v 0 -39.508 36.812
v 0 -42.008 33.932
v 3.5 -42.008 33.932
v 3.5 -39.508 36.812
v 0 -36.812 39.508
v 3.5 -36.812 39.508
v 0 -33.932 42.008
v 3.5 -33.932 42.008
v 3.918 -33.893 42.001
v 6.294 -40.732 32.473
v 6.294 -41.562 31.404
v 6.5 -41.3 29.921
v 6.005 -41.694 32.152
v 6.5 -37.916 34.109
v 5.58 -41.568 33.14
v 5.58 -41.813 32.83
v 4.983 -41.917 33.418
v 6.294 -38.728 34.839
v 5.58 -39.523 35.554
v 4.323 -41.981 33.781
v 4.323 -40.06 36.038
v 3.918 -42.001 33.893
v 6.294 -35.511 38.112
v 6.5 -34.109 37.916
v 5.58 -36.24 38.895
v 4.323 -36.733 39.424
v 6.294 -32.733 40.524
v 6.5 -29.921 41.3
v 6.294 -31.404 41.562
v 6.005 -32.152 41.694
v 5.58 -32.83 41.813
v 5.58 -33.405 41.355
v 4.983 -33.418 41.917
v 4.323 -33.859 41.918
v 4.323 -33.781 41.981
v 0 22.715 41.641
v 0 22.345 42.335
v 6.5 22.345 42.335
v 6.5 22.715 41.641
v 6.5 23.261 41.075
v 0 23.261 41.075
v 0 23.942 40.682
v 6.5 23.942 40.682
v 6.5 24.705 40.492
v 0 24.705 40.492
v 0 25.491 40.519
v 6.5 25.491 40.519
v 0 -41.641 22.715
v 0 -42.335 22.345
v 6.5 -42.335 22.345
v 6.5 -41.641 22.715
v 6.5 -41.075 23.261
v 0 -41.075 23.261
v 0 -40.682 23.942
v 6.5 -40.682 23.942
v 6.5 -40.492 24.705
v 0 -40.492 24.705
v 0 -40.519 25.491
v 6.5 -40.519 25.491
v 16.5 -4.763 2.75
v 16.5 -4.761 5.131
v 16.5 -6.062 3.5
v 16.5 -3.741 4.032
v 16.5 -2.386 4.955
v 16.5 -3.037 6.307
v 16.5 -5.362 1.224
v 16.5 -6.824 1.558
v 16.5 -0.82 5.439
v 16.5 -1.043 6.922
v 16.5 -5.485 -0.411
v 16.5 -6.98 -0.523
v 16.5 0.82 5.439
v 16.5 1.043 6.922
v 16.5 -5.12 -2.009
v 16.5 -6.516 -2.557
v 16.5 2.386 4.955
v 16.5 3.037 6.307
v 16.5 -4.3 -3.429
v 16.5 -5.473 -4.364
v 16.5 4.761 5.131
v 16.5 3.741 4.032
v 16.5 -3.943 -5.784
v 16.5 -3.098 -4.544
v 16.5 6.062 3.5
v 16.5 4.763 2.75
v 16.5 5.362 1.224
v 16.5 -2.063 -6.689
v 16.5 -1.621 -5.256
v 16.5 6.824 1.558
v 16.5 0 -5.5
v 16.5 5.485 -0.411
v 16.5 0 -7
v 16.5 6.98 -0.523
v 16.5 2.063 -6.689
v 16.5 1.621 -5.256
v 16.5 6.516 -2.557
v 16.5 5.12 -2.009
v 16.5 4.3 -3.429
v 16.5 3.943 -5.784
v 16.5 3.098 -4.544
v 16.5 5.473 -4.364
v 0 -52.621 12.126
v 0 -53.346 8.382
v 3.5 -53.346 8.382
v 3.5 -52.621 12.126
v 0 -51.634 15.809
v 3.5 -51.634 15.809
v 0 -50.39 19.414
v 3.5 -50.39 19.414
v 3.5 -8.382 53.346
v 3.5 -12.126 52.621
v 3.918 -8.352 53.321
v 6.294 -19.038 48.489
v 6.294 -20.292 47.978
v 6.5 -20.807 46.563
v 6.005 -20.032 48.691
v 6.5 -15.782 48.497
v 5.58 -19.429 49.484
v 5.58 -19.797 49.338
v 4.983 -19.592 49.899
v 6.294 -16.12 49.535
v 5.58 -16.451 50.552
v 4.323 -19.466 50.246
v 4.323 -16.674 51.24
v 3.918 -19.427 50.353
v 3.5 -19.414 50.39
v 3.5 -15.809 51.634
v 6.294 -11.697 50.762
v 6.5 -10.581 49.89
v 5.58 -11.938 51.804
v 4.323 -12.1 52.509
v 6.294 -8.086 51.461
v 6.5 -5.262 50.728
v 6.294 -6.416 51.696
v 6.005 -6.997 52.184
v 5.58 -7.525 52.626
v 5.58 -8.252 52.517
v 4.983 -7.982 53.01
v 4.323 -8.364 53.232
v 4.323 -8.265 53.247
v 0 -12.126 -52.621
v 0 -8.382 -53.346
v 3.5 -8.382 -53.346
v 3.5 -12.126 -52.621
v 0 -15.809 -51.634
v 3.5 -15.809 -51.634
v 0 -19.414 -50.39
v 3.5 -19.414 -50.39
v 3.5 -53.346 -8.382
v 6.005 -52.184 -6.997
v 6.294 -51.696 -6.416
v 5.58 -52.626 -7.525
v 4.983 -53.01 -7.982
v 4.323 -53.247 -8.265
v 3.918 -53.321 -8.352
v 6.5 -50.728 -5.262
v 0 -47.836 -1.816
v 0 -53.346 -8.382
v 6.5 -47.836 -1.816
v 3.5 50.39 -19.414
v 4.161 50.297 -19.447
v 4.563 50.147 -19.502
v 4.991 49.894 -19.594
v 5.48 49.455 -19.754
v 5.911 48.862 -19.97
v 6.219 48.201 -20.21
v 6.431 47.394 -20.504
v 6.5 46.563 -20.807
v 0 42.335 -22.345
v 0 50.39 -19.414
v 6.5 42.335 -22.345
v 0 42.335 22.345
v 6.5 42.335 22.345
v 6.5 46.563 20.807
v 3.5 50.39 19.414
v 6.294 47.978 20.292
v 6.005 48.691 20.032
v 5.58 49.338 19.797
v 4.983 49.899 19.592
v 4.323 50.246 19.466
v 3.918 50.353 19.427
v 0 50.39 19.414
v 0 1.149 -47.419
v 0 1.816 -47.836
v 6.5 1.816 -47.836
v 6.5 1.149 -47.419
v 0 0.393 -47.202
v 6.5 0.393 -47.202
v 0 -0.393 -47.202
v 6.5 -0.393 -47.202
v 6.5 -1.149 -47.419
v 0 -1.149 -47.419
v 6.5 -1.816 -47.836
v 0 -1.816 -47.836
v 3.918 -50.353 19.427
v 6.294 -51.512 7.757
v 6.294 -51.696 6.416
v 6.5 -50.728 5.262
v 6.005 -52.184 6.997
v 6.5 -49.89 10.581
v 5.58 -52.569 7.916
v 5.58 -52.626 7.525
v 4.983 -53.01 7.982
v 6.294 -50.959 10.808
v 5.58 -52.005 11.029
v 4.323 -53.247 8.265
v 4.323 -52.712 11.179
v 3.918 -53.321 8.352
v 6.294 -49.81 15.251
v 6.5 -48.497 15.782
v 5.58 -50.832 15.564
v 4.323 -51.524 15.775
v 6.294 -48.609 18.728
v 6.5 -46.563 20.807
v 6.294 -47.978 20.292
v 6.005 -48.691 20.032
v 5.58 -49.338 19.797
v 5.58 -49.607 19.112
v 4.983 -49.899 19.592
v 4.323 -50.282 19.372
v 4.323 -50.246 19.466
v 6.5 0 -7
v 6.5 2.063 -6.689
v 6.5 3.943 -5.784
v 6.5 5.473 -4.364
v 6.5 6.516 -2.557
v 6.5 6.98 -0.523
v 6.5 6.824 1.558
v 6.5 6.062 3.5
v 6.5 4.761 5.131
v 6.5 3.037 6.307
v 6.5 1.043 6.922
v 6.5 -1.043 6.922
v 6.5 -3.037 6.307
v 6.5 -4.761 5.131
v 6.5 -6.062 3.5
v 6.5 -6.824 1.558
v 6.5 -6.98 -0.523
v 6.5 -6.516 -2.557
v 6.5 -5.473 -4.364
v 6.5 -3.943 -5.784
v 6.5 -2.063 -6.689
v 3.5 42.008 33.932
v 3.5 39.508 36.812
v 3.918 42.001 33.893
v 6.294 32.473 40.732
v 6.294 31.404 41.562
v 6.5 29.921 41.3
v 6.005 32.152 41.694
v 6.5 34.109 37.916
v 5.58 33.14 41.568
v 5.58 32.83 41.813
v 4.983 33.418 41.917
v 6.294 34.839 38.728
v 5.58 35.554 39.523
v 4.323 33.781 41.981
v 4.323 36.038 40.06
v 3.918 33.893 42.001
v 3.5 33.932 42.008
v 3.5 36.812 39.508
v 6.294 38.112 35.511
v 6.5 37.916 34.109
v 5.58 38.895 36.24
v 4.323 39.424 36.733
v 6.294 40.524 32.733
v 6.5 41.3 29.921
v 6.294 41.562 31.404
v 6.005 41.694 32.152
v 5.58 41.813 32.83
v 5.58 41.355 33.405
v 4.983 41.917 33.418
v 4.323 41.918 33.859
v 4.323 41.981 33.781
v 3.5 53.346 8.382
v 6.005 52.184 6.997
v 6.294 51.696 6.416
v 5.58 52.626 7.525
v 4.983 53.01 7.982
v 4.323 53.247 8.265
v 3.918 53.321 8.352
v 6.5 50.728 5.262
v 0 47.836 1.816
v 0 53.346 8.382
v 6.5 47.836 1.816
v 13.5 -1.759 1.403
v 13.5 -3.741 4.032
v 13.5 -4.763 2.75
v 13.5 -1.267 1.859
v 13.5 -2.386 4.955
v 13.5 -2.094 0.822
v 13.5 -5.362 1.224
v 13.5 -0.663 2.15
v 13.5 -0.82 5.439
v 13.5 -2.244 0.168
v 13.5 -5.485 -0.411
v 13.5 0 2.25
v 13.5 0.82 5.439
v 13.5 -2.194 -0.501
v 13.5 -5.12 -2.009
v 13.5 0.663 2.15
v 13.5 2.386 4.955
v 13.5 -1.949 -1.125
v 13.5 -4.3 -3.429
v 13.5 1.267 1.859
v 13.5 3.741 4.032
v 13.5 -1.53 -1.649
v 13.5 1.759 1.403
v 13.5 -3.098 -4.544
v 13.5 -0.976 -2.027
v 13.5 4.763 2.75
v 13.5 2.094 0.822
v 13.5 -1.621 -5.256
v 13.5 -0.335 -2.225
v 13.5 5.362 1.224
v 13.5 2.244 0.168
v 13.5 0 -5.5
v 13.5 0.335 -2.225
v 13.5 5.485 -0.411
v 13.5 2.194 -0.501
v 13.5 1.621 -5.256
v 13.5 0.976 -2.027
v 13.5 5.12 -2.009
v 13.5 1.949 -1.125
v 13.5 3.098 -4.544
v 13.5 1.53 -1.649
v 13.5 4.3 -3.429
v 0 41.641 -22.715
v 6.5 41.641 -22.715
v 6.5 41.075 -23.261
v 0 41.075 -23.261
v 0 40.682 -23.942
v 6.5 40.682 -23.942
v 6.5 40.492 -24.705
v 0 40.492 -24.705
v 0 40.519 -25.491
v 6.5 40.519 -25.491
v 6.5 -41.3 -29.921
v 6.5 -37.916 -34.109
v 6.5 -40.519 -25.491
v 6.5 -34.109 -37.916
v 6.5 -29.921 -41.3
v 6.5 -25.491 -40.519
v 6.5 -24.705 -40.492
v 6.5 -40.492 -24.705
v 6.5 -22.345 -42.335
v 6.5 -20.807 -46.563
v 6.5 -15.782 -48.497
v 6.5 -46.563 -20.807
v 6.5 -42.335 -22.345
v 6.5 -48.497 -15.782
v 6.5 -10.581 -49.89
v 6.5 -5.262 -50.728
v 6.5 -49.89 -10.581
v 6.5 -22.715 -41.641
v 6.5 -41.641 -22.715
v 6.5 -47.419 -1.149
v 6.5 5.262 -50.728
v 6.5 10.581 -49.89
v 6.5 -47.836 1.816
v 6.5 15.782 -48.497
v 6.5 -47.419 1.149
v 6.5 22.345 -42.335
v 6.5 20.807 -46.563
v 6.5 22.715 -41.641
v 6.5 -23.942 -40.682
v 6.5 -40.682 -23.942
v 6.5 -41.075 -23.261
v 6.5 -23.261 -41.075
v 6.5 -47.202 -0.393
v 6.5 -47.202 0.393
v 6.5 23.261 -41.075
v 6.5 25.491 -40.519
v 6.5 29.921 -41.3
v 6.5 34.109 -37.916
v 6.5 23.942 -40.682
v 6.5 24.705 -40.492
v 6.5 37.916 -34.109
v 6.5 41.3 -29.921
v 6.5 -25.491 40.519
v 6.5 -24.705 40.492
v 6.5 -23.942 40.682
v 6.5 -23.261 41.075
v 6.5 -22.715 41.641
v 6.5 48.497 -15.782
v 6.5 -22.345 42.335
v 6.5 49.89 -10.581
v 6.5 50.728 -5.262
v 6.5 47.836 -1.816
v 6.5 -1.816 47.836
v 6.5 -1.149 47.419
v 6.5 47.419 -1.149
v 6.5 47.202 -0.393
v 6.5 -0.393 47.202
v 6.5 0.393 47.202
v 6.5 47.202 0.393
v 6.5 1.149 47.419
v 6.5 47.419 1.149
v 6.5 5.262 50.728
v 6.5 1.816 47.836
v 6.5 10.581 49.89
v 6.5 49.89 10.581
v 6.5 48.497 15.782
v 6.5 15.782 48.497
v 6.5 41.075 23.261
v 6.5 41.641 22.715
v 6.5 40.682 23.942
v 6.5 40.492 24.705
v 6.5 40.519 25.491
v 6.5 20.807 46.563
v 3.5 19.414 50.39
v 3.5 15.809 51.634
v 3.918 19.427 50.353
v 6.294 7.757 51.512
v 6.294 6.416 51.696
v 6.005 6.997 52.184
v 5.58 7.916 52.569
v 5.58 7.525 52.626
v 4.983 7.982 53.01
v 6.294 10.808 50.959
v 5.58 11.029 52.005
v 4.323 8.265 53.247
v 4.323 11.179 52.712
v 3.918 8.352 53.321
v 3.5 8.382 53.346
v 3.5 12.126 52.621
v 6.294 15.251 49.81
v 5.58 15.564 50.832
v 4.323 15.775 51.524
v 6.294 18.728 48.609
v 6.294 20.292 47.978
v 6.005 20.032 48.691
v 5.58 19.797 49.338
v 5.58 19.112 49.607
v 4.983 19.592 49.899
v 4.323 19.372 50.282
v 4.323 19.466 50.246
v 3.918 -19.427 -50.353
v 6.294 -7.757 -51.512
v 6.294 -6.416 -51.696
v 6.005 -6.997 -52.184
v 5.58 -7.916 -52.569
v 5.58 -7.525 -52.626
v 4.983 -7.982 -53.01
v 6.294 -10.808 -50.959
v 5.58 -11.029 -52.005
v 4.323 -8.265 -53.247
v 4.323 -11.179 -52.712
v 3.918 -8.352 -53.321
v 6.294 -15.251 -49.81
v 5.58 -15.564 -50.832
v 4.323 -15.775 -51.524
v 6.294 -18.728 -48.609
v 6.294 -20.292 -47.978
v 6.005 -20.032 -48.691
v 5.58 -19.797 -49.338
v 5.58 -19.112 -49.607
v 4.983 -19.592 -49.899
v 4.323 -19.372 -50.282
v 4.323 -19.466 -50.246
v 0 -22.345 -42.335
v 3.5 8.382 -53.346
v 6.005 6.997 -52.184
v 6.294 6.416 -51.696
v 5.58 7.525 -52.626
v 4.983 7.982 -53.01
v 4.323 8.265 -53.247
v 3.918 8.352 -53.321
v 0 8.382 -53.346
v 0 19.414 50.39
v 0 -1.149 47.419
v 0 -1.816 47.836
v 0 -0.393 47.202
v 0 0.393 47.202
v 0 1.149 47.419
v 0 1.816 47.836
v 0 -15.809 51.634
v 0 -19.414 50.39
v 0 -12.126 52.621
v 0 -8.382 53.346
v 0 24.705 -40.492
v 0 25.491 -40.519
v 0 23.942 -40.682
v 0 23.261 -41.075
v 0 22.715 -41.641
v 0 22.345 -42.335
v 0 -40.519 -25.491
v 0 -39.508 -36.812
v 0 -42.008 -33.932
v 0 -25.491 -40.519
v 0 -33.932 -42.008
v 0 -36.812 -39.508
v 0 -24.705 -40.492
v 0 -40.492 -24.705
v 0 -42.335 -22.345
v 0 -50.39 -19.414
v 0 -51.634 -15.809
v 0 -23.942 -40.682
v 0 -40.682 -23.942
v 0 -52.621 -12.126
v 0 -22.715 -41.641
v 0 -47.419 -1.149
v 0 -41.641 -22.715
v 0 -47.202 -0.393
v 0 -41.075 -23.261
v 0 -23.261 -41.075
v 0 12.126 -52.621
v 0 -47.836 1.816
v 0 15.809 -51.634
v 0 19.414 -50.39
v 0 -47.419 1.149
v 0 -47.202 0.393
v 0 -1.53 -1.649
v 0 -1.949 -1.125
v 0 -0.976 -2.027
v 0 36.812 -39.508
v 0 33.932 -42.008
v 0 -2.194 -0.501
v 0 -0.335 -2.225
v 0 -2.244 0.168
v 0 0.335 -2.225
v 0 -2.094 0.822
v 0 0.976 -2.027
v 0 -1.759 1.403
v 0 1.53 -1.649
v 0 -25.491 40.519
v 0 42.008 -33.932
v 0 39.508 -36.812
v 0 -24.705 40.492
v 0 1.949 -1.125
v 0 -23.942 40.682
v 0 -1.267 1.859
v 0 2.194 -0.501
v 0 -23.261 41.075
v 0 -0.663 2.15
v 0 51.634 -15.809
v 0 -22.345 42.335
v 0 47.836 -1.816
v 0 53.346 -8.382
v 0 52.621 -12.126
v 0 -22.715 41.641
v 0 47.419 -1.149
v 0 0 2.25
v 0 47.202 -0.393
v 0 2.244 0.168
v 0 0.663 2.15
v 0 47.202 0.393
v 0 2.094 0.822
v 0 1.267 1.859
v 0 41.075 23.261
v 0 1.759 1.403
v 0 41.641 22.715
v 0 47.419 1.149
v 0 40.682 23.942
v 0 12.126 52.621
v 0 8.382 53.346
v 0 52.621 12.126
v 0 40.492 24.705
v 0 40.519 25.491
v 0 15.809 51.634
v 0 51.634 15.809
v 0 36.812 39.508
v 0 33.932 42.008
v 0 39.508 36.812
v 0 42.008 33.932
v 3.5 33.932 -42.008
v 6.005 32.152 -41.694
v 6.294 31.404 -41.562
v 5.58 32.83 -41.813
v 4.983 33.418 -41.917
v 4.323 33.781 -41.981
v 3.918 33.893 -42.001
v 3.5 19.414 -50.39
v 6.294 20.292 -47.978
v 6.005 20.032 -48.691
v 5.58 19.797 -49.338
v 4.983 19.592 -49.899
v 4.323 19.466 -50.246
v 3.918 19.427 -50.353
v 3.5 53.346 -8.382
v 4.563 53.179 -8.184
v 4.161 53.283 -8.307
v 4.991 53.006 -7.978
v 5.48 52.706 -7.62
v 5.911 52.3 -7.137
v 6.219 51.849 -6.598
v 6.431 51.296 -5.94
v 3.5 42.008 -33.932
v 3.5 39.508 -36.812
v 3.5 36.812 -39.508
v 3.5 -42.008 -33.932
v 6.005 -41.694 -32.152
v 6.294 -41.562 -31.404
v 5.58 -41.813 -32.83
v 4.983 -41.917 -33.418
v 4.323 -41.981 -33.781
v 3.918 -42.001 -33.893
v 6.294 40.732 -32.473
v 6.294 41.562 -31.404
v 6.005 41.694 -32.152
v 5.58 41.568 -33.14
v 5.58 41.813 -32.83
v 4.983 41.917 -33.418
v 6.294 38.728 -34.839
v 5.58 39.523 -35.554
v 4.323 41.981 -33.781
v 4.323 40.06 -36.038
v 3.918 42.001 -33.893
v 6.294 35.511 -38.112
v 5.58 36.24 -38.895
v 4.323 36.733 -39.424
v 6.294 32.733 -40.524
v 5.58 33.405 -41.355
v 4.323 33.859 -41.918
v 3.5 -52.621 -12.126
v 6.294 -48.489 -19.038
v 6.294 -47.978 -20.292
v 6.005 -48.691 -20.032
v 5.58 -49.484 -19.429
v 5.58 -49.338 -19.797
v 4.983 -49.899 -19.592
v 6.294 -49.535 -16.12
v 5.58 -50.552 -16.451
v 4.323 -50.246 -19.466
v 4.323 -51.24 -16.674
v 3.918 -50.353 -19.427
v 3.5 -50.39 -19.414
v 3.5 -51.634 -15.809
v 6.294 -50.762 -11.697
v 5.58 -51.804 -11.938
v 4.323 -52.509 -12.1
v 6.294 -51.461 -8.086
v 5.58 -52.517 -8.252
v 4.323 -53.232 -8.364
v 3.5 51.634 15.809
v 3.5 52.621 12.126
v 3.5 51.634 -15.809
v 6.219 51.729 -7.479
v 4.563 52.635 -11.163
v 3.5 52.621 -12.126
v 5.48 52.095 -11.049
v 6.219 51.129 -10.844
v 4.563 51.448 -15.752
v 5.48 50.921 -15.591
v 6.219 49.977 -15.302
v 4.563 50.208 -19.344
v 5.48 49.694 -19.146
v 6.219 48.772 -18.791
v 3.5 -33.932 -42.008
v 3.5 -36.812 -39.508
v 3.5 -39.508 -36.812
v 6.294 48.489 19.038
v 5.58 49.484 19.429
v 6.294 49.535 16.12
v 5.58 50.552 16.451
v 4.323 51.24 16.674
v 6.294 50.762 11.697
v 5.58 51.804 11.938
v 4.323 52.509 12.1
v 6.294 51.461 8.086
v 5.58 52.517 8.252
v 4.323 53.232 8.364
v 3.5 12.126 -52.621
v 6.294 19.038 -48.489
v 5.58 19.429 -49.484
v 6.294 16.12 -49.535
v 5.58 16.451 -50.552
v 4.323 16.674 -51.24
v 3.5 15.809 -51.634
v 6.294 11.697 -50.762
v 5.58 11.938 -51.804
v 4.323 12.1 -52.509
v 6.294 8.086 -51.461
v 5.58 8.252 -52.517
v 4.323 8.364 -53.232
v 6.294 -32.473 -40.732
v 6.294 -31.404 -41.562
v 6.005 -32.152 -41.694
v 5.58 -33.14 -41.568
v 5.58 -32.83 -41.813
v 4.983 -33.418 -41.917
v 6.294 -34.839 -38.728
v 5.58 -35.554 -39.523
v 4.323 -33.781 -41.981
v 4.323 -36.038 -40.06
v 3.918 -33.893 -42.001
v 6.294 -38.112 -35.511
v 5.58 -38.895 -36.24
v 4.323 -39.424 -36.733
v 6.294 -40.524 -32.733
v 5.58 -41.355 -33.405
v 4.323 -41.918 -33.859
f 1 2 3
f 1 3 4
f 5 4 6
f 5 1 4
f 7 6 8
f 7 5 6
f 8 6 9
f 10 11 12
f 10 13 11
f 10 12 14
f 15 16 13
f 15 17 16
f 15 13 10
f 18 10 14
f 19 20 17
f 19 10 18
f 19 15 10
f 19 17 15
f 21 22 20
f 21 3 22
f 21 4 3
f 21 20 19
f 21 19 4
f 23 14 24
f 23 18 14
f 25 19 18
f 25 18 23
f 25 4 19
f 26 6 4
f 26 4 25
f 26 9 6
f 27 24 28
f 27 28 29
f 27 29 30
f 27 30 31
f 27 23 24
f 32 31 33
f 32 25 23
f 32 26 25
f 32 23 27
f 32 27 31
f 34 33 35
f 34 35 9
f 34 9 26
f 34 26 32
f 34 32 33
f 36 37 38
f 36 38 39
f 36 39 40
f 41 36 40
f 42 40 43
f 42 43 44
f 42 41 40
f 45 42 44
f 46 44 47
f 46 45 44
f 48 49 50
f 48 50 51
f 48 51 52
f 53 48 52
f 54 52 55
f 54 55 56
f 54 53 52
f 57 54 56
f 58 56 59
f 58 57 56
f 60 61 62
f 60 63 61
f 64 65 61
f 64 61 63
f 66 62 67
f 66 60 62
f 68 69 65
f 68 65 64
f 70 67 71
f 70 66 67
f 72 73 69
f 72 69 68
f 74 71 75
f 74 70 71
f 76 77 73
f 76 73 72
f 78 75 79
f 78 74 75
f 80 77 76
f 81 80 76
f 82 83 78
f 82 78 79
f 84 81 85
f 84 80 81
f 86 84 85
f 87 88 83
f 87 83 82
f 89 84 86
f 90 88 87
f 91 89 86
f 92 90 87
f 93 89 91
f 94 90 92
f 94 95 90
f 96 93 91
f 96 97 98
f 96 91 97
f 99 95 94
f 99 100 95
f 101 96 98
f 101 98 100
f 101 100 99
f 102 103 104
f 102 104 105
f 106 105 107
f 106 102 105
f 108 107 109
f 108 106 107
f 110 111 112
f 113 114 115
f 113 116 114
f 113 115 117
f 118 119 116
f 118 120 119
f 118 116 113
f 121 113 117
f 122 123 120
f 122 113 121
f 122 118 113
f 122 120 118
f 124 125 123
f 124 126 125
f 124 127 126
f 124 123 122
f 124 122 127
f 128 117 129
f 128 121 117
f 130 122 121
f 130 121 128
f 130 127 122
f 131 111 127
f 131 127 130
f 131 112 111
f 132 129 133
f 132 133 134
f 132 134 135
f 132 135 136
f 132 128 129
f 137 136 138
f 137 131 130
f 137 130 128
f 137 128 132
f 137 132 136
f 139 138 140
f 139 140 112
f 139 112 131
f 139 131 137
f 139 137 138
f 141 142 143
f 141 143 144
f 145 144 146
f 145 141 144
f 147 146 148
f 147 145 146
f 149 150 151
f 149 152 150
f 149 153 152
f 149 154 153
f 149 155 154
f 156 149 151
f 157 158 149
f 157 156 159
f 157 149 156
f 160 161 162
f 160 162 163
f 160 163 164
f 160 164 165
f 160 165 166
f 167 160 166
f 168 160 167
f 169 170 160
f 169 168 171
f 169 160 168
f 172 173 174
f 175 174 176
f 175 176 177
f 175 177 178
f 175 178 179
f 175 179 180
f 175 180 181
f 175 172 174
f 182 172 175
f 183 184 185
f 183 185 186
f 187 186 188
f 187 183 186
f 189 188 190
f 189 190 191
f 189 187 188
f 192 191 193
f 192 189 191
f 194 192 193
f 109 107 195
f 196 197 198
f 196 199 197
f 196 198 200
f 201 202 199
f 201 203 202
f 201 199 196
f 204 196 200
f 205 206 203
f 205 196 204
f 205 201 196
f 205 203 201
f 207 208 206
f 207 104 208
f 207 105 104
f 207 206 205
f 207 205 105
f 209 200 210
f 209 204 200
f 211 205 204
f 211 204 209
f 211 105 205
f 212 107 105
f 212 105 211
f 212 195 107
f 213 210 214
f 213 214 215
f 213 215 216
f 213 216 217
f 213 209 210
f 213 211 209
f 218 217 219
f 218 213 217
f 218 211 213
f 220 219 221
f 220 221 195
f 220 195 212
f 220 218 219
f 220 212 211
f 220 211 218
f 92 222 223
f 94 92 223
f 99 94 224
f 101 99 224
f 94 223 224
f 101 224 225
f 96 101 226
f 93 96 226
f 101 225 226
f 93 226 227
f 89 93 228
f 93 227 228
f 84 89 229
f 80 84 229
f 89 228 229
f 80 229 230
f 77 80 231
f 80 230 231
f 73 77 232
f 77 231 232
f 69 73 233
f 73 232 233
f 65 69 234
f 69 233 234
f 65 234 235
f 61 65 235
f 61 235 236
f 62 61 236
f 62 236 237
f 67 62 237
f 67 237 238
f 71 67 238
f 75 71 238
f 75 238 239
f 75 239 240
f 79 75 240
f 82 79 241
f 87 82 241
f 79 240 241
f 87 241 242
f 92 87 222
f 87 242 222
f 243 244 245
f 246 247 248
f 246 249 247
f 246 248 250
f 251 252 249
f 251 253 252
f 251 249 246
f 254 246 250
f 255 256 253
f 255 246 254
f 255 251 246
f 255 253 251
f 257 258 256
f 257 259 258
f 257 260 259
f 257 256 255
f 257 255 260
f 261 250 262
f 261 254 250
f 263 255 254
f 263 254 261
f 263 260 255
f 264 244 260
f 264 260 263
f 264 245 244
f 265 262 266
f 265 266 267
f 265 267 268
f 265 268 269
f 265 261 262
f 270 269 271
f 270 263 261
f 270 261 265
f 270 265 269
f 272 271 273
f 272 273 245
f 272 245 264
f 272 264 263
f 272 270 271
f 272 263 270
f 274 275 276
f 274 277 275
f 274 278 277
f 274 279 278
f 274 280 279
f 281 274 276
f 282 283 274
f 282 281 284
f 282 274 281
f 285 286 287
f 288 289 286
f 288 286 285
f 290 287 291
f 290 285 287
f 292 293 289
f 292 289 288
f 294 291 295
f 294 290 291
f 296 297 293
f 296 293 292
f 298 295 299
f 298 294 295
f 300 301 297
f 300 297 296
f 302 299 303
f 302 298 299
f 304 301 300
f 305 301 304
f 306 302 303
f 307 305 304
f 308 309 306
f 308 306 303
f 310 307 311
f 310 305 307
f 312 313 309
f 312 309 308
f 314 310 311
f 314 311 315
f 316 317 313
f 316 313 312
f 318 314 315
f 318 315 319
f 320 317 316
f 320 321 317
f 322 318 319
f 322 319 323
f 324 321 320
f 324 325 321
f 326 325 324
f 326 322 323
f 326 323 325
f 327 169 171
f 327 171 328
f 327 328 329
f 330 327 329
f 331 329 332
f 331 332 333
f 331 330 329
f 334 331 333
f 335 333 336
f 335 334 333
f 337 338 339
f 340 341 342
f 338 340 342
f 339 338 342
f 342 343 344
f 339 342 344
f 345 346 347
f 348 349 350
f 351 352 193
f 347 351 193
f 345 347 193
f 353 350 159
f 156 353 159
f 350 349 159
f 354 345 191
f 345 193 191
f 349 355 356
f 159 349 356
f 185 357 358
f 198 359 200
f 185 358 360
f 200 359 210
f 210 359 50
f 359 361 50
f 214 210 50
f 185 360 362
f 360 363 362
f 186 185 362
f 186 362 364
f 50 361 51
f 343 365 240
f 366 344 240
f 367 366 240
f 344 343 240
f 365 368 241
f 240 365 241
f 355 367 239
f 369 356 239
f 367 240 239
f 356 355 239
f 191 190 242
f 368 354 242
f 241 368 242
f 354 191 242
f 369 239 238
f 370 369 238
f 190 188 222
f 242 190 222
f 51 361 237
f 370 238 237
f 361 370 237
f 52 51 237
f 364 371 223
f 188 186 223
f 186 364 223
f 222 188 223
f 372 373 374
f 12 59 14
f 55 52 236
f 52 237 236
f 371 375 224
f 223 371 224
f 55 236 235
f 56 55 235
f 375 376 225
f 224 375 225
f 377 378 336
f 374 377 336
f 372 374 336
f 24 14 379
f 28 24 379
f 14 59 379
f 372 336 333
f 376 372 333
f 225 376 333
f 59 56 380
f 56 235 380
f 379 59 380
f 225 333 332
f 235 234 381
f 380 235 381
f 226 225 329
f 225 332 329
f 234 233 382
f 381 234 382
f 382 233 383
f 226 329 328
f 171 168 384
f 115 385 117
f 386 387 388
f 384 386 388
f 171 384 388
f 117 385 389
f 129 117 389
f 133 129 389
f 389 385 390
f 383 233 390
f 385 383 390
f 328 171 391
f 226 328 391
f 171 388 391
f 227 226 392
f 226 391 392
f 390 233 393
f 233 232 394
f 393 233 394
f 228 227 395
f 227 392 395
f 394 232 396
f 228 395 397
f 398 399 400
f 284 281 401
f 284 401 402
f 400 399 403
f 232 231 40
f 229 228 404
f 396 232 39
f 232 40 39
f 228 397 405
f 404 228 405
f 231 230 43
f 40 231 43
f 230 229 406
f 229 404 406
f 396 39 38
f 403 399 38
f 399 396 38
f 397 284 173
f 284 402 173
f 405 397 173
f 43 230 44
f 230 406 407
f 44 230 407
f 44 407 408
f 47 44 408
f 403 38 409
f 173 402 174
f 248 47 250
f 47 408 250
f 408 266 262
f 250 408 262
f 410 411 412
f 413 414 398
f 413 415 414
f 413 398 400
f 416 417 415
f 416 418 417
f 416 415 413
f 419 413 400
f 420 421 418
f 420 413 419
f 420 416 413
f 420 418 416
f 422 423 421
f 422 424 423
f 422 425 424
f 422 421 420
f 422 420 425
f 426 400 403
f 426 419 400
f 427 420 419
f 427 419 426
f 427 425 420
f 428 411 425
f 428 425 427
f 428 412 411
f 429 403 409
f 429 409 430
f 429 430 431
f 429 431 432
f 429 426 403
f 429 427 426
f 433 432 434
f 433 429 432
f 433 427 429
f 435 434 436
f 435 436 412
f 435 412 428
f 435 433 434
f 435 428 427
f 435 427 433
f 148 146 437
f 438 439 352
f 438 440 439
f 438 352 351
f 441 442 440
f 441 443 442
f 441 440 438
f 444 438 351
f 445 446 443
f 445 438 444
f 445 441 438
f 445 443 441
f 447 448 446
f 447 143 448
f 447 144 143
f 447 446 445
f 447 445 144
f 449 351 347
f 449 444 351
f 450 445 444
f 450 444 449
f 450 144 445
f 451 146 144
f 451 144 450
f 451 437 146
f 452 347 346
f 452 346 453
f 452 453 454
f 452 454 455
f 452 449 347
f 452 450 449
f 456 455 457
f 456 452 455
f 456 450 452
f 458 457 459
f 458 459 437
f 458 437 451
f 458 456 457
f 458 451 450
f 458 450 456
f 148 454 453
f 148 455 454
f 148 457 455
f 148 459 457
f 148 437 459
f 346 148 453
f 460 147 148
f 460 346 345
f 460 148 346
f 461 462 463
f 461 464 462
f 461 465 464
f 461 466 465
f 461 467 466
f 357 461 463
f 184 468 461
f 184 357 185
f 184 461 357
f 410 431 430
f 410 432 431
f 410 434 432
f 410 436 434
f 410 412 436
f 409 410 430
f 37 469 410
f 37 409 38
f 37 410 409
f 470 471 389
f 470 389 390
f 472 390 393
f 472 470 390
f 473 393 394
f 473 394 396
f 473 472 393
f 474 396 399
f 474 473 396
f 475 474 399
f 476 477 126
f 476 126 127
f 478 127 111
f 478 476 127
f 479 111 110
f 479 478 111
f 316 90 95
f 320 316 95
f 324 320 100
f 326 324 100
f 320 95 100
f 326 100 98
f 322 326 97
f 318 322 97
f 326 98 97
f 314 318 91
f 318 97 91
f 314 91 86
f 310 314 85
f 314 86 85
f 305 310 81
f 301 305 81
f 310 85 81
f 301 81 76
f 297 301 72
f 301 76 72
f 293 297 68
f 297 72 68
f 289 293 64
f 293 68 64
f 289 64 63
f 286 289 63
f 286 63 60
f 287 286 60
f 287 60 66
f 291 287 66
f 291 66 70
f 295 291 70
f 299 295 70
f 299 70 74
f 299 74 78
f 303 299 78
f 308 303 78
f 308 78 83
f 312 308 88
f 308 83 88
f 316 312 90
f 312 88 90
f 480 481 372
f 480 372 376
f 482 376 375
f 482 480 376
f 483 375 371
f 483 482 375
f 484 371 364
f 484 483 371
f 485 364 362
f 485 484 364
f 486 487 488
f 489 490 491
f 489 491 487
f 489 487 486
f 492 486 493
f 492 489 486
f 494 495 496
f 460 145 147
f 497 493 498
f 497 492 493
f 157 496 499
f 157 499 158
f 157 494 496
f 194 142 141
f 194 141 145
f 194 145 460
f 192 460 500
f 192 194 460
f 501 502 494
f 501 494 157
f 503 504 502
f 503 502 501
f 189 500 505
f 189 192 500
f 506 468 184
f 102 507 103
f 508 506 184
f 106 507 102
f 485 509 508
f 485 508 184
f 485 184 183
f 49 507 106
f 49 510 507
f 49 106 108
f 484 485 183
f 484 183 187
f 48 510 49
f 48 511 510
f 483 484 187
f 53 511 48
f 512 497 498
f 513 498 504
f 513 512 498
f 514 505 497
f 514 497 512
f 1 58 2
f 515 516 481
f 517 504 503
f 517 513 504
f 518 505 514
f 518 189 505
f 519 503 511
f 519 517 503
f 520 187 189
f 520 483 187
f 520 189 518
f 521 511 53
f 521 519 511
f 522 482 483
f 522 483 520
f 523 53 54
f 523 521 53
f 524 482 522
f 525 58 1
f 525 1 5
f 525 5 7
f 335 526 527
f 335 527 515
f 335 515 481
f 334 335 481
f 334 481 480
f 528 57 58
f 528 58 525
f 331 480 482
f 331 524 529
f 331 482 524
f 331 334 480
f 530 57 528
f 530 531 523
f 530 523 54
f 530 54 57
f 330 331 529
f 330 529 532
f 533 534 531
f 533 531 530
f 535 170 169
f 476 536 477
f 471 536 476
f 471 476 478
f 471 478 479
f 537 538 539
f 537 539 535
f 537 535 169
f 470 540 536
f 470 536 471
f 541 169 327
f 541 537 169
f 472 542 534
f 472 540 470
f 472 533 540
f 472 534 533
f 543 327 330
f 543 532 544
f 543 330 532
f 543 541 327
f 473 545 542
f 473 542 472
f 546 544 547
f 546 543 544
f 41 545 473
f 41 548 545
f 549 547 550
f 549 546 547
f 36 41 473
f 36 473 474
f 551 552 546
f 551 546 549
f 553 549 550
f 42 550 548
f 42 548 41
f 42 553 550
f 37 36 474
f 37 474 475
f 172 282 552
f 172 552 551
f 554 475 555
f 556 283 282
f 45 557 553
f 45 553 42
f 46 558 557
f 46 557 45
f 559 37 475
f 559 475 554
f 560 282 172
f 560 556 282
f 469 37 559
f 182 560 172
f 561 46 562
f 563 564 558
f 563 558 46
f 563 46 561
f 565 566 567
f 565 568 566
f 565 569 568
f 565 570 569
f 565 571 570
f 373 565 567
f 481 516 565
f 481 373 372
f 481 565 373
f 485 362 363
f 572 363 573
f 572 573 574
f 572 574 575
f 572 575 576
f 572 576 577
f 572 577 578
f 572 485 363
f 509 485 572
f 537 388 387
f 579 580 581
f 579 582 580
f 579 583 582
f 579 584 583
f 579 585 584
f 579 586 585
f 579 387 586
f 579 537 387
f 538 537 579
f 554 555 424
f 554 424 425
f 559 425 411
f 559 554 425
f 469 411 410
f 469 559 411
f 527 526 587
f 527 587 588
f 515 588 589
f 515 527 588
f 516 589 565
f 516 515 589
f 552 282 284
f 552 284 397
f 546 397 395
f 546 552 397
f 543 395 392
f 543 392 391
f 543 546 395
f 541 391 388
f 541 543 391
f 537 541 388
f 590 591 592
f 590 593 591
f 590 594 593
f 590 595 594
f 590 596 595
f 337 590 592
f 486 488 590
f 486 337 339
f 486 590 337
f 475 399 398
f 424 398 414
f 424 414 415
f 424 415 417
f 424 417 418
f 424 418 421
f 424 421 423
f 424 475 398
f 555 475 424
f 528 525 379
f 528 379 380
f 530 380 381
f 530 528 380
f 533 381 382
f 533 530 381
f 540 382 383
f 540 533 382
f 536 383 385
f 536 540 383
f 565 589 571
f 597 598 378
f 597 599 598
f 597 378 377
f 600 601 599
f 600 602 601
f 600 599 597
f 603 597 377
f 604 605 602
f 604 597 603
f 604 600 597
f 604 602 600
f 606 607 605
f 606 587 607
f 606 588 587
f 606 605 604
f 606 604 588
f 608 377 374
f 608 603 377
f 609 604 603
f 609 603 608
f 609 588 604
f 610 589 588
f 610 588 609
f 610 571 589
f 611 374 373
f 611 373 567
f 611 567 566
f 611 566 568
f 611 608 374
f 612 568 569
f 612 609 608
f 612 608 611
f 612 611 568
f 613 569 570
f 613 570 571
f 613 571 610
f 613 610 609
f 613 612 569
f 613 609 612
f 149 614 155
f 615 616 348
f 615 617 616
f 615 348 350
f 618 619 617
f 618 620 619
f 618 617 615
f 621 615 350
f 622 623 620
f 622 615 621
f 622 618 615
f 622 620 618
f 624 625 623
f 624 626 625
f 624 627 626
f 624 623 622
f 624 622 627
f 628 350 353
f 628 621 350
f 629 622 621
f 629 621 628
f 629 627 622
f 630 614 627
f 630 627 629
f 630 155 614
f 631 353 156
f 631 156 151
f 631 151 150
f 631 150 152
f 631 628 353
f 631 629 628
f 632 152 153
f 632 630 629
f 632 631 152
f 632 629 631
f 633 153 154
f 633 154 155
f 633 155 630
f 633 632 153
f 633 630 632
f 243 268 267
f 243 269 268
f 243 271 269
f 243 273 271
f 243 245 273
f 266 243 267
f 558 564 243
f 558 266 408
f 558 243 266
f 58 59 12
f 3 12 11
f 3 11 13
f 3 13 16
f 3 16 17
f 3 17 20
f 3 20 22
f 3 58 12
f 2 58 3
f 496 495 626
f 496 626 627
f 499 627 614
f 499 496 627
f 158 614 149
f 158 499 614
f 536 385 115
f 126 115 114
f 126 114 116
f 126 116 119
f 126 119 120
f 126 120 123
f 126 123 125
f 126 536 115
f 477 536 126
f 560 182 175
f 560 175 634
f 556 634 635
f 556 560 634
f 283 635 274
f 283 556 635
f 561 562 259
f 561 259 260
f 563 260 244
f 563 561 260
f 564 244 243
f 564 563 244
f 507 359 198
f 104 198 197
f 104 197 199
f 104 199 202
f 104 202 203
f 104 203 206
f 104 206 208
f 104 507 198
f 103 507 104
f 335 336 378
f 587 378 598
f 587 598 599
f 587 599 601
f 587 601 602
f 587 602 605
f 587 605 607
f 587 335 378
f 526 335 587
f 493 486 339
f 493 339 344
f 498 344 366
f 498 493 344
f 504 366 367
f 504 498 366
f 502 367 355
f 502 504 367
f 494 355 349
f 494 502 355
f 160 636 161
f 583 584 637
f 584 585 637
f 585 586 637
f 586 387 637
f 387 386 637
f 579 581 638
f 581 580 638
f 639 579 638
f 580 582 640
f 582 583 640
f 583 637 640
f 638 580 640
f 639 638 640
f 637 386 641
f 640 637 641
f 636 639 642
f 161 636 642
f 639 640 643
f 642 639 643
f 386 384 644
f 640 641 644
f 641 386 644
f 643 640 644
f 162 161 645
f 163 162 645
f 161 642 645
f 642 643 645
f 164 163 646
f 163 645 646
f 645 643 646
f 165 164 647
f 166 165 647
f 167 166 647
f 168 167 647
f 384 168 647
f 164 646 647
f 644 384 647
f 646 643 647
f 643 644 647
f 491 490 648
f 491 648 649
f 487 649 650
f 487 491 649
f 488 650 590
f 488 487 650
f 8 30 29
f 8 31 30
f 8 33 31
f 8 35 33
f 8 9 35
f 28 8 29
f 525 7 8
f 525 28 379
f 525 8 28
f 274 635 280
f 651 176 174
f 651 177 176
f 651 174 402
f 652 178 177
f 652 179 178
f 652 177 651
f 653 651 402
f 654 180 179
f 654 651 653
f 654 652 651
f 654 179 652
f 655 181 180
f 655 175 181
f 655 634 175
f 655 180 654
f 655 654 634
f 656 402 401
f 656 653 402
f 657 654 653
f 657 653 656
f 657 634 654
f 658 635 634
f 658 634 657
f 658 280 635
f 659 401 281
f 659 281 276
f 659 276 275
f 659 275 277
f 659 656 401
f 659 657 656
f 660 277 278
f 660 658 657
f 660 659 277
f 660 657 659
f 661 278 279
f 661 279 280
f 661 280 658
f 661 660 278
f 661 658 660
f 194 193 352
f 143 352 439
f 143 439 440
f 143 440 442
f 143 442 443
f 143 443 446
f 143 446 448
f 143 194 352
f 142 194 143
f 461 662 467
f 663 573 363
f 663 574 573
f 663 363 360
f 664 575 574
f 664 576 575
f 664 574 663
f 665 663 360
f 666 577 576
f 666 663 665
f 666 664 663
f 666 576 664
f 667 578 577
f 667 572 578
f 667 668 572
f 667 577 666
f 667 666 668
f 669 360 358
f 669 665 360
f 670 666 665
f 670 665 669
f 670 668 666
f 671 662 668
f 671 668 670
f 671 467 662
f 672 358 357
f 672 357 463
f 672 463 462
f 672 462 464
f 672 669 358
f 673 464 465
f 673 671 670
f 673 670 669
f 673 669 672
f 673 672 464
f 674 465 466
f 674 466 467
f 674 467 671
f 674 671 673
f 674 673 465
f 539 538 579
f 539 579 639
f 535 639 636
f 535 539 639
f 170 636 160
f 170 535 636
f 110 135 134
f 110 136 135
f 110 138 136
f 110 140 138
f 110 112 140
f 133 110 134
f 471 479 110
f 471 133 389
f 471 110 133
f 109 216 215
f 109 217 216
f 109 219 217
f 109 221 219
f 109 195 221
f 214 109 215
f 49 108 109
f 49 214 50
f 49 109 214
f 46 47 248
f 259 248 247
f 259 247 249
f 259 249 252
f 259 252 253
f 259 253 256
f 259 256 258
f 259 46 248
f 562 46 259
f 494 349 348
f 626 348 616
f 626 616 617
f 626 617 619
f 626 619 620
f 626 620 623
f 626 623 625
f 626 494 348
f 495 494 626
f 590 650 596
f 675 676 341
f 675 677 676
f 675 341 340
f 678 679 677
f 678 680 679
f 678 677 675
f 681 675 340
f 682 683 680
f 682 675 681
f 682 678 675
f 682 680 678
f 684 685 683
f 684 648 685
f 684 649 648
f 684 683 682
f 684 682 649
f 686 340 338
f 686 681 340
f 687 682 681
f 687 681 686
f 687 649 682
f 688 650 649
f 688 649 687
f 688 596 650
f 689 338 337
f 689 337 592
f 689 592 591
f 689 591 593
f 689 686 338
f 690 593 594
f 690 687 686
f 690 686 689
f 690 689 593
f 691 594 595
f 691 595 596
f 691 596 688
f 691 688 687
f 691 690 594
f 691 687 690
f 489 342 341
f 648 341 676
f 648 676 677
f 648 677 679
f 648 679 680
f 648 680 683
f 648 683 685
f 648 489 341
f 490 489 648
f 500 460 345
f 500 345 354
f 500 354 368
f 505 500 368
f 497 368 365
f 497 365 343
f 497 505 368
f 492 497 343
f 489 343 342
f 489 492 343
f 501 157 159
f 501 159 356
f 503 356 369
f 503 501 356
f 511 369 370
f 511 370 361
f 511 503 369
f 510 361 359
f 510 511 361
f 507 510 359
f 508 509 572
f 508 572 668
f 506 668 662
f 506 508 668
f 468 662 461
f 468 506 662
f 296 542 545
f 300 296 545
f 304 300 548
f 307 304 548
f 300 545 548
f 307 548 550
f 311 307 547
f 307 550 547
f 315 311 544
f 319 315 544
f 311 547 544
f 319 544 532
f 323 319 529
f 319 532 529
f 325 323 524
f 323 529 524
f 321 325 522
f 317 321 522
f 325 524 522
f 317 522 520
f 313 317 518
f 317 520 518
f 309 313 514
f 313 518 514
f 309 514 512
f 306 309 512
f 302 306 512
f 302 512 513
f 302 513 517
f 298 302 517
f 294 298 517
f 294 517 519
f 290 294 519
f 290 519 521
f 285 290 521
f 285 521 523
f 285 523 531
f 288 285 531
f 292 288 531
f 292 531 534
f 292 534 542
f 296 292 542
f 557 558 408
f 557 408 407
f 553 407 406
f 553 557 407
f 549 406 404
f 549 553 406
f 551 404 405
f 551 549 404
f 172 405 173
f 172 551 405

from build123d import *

# Parameters (mm, degrees)
BOSS_EXTRUDE1_DEPTH     = 6.5
SKETCH2_R               = 7
BOSS_EXTRUDE2_DEPTH     = 10
SKETCH3_R               = 5.5
CUT_EXTRUDE1_DEPTH      = 3
SKETCH4_R               = 2.25
CUT_EXTRUDE2_DEPTH      = 1
CUT_EXTRUDE2_DEPTH_BACK = 17.5
FILLET1_R               = 3


with BuildPart() as part:
    # Sketch1 → Boss-Extrude1 (new body)
    with BuildSketch(Plane(origin=(0, 0, 0), x_dir=(0, 0, -1), z_dir=(1, 0, 0))):
        with BuildLine():
            Line((1.815874997, 47.835924448), (8.381939498, 53.345506749))
            ThreePointArc((8.381939498, 53.345506749), (13.976228436, 52.15999462), (19.413780836, 50.389533771))
            Line((19.413780836, 50.389533771), (22.345368346, 42.335063284))
            ThreePointArc((22.345368346, 42.335063284), (23.5875, 40.854748424), (25.490556102, 40.519188287))
            Line((25.490556102, 40.519188287), (33.931725912, 42.007594273))
            ThreePointArc((33.931725912, 42.007594273), (38.183766184, 38.183766184), (42.007594273, 33.931725912))
            Line((42.007594273, 33.931725912), (40.519188287, 25.490556102))
            ThreePointArc((40.519188287, 25.490556102), (40.854748424, 23.5875), (42.335063284, 22.345368346))
            Line((42.335063284, 22.345368346), (50.389533771, 19.413780836))
            ThreePointArc((50.389533771, 19.413780836), (52.15999462, 13.976228436), (53.345506749, 8.381939498))
            Line((53.345506749, 8.381939498), (47.835924448, 1.815874997))
            ThreePointArc((47.835924448, 1.815874997), (47.175, 0), (47.835924448, -1.815874997))
            Line((47.835924448, -1.815874997), (53.345506749, -8.381939498))
            ThreePointArc((53.345506749, -8.381939498), (52.15999462, -13.976228436), (50.389533771, -19.413780836))
            Line((50.389533771, -19.413780836), (42.335063284, -22.345368346))
            ThreePointArc((42.335063284, -22.345368346), (40.854748424, -23.5875), (40.519188287, -25.490556102))
            Line((40.519188287, -25.490556102), (42.007594273, -33.931725912))
            ThreePointArc((42.007594273, -33.931725912), (38.183766184, -38.183766184), (33.931725912, -42.007594273))
            Line((33.931725912, -42.007594273), (25.490556102, -40.519188287))
            ThreePointArc((25.490556102, -40.519188287), (23.5875, -40.854748424), (22.345368346, -42.335063284))
            Line((22.345368346, -42.335063284), (19.413780836, -50.389533771))
            ThreePointArc((19.413780836, -50.389533771), (13.976228436, -52.15999462), (8.381939498, -53.345506749))
            Line((8.381939498, -53.345506749), (1.815874997, -47.835924448))
            ThreePointArc((1.815874997, -47.835924448), (0, -47.175), (-1.815874997, -47.835924448))
            Line((-1.815874997, -47.835924448), (-8.381939498, -53.345506749))
            ThreePointArc((-8.381939498, -53.345506749), (-13.976228436, -52.15999462), (-19.413780836, -50.389533771))
            Line((-19.413780836, -50.389533771), (-22.345368346, -42.335063284))
            ThreePointArc((-22.345368346, -42.335063284), (-23.5875, -40.854748424), (-25.490556102, -40.519188287))
            Line((-25.490556102, -40.519188287), (-33.931725912, -42.007594273))
            ThreePointArc((-33.931725912, -42.007594273), (-38.183766184, -38.183766184), (-42.007594273, -33.931725912))
            Line((-42.007594273, -33.931725912), (-40.519188287, -25.490556102))
            ThreePointArc((-40.519188287, -25.490556102), (-40.854748424, -23.5875), (-42.335063284, -22.345368346))
            Line((-42.335063284, -22.345368346), (-50.389533771, -19.413780836))
            ThreePointArc((-50.389533771, -19.413780836), (-52.15999462, -13.976228436), (-53.345506749, -8.381939498))
            Line((-53.345506749, -8.381939498), (-47.835924448, -1.815874997))
            ThreePointArc((-47.835924448, -1.815874997), (-47.175, 0), (-47.835924448, 1.815874997))
            Line((-47.835924448, 1.815874997), (-53.345506749, 8.381939498))
            ThreePointArc((-53.345506749, 8.381939498), (-52.15999462, 13.976228436), (-50.389533771, 19.413780836))
            Line((-50.389533771, 19.413780836), (-42.335063284, 22.345368346))
            ThreePointArc((-42.335063284, 22.345368346), (-40.854748424, 23.5875), (-40.519188287, 25.490556102))
            Line((-40.519188287, 25.490556102), (-42.007594273, 33.931725912))
            ThreePointArc((-42.007594273, 33.931725912), (-38.183766184, 38.183766184), (-33.931725912, 42.007594273))
            Line((-33.931725912, 42.007594273), (-25.490556102, 40.519188287))
            ThreePointArc((-25.490556102, 40.519188287), (-23.5875, 40.854748424), (-22.345368346, 42.335063284))
            Line((-22.345368346, 42.335063284), (-19.413780836, 50.389533771))
            ThreePointArc((-19.413780836, 50.389533771), (-13.976228436, 52.15999462), (-8.381939498, 53.345506749))
            Line((-8.381939498, 53.345506749), (-1.815874997, 47.835924448))
            ThreePointArc((-1.815874997, 47.835924448), (0, 47.175), (1.815874997, 47.835924448))
        make_face()
    extrude(amount=BOSS_EXTRUDE1_DEPTH)

    # Sketch2 → Boss-Extrude2 (add)
    with BuildSketch(Plane(origin=(6.5, 0, 0), x_dir=(0, 0, -1), z_dir=(1, 0, 0))):
        Circle(SKETCH2_R)
    extrude(amount=BOSS_EXTRUDE2_DEPTH)

    # Sketch3 → Cut-Extrude1 (cut)
    with BuildSketch(Plane(origin=(16.5, 0, 0), x_dir=(0, 0, -1), z_dir=(1, 0, 0))):
        Circle(SKETCH3_R)
    extrude(amount=-CUT_EXTRUDE1_DEPTH, mode=Mode.SUBTRACT)

    # Sketch4 → Cut-Extrude2 (cut, two sides)
    with BuildSketch(Plane.ZY) as cut_extrude2_sk:
        Circle(SKETCH4_R)
    extrude(amount=CUT_EXTRUDE2_DEPTH, mode=Mode.SUBTRACT)
    extrude(cut_extrude2_sk.sketch, amount=-CUT_EXTRUDE2_DEPTH_BACK, mode=Mode.SUBTRACT)

    # Fillet1
    fillet1_edges = [part.edges().sort_by_distance(p)[0] for p in [
        (6.5, -52.15999462, 13.976228436),
        (6.5, -52.15999462, -13.976228436),
        (6.5, 52.15999462, -13.976228436),
        (6.5, -38.183766184, -38.183766184),
        (6.5, -13.976228436, -52.15999462),
        (6.5, 13.976228436, -52.15999462),
        (6.5, 38.183766184, -38.183766184),
        (6.5, 52.15999462, 13.976228436),
        (6.5, 38.183766184, 38.183766184),
        (6.5, 13.976228436, 52.15999462),
        (6.5, -13.976228436, 52.15999462),
        (6.5, -38.183766184, 38.183766184),
    ]]
    fillet(fillet1_edges, radius=FILLET1_R)


solid = part.part
